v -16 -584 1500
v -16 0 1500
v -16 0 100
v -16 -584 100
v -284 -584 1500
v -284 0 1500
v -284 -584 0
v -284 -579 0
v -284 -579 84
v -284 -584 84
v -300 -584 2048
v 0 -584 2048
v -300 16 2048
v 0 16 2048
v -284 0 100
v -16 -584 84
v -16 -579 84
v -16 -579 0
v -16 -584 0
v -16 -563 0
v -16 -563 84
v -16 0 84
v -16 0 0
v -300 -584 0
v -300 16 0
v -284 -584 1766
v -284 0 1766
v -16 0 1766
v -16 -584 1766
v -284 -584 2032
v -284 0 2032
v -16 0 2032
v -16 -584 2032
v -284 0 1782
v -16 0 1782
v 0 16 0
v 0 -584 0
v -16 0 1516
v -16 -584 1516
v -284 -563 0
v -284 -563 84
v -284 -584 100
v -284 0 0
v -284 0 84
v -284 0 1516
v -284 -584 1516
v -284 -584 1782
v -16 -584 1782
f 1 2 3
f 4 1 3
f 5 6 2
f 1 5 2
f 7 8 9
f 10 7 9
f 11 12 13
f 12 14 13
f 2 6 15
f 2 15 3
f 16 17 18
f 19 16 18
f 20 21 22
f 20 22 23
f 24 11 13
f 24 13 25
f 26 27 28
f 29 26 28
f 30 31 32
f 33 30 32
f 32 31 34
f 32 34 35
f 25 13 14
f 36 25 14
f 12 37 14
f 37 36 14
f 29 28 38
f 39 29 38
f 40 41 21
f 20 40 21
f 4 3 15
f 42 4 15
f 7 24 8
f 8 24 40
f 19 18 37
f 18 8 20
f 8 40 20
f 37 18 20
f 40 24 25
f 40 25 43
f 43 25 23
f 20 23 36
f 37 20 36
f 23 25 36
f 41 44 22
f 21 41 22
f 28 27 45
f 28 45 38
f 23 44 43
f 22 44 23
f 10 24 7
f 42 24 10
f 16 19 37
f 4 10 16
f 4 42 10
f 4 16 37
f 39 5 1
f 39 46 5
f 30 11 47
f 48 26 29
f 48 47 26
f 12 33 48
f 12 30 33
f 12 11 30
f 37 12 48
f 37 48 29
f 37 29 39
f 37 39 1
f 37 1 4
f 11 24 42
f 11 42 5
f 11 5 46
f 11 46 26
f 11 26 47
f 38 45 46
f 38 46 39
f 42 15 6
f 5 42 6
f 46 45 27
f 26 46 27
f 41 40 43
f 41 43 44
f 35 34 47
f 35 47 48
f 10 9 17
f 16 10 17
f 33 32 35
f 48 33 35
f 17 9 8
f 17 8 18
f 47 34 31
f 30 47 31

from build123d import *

# Parameters (mm, degrees)
F0_W     = 268
F0_H     = 84
F0_H_2   = 1400
F0_H_3   = 16
F0_H_4   = 250
F1_DEPTH = 16
F2_DEPTH = 584
F3_W     = 268
F3_H     = 16
F4_DEPTH = 84


with BuildPart() as f1:
    # F0 (on Front) → F1 (new body)
    with BuildSketch(Plane.XZ):
        Polygon((-16, 0), (0, 0), (0, 2048), (-300, 2048), (-300, 0), (-284, 0), (-284, 84), (-16, 84), align=None)
        Polygon((-16, 100), (-284, 100), (-284, 1500), (-284, 1516), (-284, 1766), (-284, 1782), (-284, 2032), (-16, 2032), (-16, 1782), (-16, 1766), (-16, 1516), (-16, 1500), align=None, mode=Mode.SUBTRACT)
        with Locations((-150, 42)):
            Rectangle(F0_W, F0_H)
        with Locations((-150, 800)):
            Rectangle(F0_W, F0_H_2)
        with Locations((-150, 1508)):
            Rectangle(F0_W, F0_H_3)
        with Locations((-150, 1641)):
            Rectangle(F0_W, F0_H_4)
        with Locations((-150, 1774)):
            Rectangle(F0_W, F0_H_3)
        with Locations((-150, 1907)):
            Rectangle(F0_W, F0_H_4)
    extrude(amount=-F1_DEPTH)

    # F0 (on Front) → F2 (join)
    with BuildSketch(Plane.XZ):
        Polygon((-16, 0), (0, 0), (0, 2048), (-300, 2048), (-300, 0), (-284, 0), (-284, 84), (-16, 84), align=None)
        Polygon((-16, 100), (-284, 100), (-284, 1500), (-284, 1516), (-284, 1766), (-284, 1782), (-284, 2032), (-16, 2032), (-16, 1782), (-16, 1766), (-16, 1516), (-16, 1500), align=None, mode=Mode.SUBTRACT)
        with Locations((-150, 1508)):
            Rectangle(F0_W, F0_H_3)
        with Locations((-150, 1774)):
            Rectangle(F0_W, F0_H_3)
    extrude(amount=F2_DEPTH)

    # F3 (on face) → F4 (join, through all)
    with BuildSketch(Plane(origin=(0, 0, 84), x_dir=(1, 0, 0), z_dir=(0, 0, -1))):
        with Locations((-150, 571)):
            Rectangle(F3_W, F3_H)
    extrude(amount=F4_DEPTH)


solid = f1.part
